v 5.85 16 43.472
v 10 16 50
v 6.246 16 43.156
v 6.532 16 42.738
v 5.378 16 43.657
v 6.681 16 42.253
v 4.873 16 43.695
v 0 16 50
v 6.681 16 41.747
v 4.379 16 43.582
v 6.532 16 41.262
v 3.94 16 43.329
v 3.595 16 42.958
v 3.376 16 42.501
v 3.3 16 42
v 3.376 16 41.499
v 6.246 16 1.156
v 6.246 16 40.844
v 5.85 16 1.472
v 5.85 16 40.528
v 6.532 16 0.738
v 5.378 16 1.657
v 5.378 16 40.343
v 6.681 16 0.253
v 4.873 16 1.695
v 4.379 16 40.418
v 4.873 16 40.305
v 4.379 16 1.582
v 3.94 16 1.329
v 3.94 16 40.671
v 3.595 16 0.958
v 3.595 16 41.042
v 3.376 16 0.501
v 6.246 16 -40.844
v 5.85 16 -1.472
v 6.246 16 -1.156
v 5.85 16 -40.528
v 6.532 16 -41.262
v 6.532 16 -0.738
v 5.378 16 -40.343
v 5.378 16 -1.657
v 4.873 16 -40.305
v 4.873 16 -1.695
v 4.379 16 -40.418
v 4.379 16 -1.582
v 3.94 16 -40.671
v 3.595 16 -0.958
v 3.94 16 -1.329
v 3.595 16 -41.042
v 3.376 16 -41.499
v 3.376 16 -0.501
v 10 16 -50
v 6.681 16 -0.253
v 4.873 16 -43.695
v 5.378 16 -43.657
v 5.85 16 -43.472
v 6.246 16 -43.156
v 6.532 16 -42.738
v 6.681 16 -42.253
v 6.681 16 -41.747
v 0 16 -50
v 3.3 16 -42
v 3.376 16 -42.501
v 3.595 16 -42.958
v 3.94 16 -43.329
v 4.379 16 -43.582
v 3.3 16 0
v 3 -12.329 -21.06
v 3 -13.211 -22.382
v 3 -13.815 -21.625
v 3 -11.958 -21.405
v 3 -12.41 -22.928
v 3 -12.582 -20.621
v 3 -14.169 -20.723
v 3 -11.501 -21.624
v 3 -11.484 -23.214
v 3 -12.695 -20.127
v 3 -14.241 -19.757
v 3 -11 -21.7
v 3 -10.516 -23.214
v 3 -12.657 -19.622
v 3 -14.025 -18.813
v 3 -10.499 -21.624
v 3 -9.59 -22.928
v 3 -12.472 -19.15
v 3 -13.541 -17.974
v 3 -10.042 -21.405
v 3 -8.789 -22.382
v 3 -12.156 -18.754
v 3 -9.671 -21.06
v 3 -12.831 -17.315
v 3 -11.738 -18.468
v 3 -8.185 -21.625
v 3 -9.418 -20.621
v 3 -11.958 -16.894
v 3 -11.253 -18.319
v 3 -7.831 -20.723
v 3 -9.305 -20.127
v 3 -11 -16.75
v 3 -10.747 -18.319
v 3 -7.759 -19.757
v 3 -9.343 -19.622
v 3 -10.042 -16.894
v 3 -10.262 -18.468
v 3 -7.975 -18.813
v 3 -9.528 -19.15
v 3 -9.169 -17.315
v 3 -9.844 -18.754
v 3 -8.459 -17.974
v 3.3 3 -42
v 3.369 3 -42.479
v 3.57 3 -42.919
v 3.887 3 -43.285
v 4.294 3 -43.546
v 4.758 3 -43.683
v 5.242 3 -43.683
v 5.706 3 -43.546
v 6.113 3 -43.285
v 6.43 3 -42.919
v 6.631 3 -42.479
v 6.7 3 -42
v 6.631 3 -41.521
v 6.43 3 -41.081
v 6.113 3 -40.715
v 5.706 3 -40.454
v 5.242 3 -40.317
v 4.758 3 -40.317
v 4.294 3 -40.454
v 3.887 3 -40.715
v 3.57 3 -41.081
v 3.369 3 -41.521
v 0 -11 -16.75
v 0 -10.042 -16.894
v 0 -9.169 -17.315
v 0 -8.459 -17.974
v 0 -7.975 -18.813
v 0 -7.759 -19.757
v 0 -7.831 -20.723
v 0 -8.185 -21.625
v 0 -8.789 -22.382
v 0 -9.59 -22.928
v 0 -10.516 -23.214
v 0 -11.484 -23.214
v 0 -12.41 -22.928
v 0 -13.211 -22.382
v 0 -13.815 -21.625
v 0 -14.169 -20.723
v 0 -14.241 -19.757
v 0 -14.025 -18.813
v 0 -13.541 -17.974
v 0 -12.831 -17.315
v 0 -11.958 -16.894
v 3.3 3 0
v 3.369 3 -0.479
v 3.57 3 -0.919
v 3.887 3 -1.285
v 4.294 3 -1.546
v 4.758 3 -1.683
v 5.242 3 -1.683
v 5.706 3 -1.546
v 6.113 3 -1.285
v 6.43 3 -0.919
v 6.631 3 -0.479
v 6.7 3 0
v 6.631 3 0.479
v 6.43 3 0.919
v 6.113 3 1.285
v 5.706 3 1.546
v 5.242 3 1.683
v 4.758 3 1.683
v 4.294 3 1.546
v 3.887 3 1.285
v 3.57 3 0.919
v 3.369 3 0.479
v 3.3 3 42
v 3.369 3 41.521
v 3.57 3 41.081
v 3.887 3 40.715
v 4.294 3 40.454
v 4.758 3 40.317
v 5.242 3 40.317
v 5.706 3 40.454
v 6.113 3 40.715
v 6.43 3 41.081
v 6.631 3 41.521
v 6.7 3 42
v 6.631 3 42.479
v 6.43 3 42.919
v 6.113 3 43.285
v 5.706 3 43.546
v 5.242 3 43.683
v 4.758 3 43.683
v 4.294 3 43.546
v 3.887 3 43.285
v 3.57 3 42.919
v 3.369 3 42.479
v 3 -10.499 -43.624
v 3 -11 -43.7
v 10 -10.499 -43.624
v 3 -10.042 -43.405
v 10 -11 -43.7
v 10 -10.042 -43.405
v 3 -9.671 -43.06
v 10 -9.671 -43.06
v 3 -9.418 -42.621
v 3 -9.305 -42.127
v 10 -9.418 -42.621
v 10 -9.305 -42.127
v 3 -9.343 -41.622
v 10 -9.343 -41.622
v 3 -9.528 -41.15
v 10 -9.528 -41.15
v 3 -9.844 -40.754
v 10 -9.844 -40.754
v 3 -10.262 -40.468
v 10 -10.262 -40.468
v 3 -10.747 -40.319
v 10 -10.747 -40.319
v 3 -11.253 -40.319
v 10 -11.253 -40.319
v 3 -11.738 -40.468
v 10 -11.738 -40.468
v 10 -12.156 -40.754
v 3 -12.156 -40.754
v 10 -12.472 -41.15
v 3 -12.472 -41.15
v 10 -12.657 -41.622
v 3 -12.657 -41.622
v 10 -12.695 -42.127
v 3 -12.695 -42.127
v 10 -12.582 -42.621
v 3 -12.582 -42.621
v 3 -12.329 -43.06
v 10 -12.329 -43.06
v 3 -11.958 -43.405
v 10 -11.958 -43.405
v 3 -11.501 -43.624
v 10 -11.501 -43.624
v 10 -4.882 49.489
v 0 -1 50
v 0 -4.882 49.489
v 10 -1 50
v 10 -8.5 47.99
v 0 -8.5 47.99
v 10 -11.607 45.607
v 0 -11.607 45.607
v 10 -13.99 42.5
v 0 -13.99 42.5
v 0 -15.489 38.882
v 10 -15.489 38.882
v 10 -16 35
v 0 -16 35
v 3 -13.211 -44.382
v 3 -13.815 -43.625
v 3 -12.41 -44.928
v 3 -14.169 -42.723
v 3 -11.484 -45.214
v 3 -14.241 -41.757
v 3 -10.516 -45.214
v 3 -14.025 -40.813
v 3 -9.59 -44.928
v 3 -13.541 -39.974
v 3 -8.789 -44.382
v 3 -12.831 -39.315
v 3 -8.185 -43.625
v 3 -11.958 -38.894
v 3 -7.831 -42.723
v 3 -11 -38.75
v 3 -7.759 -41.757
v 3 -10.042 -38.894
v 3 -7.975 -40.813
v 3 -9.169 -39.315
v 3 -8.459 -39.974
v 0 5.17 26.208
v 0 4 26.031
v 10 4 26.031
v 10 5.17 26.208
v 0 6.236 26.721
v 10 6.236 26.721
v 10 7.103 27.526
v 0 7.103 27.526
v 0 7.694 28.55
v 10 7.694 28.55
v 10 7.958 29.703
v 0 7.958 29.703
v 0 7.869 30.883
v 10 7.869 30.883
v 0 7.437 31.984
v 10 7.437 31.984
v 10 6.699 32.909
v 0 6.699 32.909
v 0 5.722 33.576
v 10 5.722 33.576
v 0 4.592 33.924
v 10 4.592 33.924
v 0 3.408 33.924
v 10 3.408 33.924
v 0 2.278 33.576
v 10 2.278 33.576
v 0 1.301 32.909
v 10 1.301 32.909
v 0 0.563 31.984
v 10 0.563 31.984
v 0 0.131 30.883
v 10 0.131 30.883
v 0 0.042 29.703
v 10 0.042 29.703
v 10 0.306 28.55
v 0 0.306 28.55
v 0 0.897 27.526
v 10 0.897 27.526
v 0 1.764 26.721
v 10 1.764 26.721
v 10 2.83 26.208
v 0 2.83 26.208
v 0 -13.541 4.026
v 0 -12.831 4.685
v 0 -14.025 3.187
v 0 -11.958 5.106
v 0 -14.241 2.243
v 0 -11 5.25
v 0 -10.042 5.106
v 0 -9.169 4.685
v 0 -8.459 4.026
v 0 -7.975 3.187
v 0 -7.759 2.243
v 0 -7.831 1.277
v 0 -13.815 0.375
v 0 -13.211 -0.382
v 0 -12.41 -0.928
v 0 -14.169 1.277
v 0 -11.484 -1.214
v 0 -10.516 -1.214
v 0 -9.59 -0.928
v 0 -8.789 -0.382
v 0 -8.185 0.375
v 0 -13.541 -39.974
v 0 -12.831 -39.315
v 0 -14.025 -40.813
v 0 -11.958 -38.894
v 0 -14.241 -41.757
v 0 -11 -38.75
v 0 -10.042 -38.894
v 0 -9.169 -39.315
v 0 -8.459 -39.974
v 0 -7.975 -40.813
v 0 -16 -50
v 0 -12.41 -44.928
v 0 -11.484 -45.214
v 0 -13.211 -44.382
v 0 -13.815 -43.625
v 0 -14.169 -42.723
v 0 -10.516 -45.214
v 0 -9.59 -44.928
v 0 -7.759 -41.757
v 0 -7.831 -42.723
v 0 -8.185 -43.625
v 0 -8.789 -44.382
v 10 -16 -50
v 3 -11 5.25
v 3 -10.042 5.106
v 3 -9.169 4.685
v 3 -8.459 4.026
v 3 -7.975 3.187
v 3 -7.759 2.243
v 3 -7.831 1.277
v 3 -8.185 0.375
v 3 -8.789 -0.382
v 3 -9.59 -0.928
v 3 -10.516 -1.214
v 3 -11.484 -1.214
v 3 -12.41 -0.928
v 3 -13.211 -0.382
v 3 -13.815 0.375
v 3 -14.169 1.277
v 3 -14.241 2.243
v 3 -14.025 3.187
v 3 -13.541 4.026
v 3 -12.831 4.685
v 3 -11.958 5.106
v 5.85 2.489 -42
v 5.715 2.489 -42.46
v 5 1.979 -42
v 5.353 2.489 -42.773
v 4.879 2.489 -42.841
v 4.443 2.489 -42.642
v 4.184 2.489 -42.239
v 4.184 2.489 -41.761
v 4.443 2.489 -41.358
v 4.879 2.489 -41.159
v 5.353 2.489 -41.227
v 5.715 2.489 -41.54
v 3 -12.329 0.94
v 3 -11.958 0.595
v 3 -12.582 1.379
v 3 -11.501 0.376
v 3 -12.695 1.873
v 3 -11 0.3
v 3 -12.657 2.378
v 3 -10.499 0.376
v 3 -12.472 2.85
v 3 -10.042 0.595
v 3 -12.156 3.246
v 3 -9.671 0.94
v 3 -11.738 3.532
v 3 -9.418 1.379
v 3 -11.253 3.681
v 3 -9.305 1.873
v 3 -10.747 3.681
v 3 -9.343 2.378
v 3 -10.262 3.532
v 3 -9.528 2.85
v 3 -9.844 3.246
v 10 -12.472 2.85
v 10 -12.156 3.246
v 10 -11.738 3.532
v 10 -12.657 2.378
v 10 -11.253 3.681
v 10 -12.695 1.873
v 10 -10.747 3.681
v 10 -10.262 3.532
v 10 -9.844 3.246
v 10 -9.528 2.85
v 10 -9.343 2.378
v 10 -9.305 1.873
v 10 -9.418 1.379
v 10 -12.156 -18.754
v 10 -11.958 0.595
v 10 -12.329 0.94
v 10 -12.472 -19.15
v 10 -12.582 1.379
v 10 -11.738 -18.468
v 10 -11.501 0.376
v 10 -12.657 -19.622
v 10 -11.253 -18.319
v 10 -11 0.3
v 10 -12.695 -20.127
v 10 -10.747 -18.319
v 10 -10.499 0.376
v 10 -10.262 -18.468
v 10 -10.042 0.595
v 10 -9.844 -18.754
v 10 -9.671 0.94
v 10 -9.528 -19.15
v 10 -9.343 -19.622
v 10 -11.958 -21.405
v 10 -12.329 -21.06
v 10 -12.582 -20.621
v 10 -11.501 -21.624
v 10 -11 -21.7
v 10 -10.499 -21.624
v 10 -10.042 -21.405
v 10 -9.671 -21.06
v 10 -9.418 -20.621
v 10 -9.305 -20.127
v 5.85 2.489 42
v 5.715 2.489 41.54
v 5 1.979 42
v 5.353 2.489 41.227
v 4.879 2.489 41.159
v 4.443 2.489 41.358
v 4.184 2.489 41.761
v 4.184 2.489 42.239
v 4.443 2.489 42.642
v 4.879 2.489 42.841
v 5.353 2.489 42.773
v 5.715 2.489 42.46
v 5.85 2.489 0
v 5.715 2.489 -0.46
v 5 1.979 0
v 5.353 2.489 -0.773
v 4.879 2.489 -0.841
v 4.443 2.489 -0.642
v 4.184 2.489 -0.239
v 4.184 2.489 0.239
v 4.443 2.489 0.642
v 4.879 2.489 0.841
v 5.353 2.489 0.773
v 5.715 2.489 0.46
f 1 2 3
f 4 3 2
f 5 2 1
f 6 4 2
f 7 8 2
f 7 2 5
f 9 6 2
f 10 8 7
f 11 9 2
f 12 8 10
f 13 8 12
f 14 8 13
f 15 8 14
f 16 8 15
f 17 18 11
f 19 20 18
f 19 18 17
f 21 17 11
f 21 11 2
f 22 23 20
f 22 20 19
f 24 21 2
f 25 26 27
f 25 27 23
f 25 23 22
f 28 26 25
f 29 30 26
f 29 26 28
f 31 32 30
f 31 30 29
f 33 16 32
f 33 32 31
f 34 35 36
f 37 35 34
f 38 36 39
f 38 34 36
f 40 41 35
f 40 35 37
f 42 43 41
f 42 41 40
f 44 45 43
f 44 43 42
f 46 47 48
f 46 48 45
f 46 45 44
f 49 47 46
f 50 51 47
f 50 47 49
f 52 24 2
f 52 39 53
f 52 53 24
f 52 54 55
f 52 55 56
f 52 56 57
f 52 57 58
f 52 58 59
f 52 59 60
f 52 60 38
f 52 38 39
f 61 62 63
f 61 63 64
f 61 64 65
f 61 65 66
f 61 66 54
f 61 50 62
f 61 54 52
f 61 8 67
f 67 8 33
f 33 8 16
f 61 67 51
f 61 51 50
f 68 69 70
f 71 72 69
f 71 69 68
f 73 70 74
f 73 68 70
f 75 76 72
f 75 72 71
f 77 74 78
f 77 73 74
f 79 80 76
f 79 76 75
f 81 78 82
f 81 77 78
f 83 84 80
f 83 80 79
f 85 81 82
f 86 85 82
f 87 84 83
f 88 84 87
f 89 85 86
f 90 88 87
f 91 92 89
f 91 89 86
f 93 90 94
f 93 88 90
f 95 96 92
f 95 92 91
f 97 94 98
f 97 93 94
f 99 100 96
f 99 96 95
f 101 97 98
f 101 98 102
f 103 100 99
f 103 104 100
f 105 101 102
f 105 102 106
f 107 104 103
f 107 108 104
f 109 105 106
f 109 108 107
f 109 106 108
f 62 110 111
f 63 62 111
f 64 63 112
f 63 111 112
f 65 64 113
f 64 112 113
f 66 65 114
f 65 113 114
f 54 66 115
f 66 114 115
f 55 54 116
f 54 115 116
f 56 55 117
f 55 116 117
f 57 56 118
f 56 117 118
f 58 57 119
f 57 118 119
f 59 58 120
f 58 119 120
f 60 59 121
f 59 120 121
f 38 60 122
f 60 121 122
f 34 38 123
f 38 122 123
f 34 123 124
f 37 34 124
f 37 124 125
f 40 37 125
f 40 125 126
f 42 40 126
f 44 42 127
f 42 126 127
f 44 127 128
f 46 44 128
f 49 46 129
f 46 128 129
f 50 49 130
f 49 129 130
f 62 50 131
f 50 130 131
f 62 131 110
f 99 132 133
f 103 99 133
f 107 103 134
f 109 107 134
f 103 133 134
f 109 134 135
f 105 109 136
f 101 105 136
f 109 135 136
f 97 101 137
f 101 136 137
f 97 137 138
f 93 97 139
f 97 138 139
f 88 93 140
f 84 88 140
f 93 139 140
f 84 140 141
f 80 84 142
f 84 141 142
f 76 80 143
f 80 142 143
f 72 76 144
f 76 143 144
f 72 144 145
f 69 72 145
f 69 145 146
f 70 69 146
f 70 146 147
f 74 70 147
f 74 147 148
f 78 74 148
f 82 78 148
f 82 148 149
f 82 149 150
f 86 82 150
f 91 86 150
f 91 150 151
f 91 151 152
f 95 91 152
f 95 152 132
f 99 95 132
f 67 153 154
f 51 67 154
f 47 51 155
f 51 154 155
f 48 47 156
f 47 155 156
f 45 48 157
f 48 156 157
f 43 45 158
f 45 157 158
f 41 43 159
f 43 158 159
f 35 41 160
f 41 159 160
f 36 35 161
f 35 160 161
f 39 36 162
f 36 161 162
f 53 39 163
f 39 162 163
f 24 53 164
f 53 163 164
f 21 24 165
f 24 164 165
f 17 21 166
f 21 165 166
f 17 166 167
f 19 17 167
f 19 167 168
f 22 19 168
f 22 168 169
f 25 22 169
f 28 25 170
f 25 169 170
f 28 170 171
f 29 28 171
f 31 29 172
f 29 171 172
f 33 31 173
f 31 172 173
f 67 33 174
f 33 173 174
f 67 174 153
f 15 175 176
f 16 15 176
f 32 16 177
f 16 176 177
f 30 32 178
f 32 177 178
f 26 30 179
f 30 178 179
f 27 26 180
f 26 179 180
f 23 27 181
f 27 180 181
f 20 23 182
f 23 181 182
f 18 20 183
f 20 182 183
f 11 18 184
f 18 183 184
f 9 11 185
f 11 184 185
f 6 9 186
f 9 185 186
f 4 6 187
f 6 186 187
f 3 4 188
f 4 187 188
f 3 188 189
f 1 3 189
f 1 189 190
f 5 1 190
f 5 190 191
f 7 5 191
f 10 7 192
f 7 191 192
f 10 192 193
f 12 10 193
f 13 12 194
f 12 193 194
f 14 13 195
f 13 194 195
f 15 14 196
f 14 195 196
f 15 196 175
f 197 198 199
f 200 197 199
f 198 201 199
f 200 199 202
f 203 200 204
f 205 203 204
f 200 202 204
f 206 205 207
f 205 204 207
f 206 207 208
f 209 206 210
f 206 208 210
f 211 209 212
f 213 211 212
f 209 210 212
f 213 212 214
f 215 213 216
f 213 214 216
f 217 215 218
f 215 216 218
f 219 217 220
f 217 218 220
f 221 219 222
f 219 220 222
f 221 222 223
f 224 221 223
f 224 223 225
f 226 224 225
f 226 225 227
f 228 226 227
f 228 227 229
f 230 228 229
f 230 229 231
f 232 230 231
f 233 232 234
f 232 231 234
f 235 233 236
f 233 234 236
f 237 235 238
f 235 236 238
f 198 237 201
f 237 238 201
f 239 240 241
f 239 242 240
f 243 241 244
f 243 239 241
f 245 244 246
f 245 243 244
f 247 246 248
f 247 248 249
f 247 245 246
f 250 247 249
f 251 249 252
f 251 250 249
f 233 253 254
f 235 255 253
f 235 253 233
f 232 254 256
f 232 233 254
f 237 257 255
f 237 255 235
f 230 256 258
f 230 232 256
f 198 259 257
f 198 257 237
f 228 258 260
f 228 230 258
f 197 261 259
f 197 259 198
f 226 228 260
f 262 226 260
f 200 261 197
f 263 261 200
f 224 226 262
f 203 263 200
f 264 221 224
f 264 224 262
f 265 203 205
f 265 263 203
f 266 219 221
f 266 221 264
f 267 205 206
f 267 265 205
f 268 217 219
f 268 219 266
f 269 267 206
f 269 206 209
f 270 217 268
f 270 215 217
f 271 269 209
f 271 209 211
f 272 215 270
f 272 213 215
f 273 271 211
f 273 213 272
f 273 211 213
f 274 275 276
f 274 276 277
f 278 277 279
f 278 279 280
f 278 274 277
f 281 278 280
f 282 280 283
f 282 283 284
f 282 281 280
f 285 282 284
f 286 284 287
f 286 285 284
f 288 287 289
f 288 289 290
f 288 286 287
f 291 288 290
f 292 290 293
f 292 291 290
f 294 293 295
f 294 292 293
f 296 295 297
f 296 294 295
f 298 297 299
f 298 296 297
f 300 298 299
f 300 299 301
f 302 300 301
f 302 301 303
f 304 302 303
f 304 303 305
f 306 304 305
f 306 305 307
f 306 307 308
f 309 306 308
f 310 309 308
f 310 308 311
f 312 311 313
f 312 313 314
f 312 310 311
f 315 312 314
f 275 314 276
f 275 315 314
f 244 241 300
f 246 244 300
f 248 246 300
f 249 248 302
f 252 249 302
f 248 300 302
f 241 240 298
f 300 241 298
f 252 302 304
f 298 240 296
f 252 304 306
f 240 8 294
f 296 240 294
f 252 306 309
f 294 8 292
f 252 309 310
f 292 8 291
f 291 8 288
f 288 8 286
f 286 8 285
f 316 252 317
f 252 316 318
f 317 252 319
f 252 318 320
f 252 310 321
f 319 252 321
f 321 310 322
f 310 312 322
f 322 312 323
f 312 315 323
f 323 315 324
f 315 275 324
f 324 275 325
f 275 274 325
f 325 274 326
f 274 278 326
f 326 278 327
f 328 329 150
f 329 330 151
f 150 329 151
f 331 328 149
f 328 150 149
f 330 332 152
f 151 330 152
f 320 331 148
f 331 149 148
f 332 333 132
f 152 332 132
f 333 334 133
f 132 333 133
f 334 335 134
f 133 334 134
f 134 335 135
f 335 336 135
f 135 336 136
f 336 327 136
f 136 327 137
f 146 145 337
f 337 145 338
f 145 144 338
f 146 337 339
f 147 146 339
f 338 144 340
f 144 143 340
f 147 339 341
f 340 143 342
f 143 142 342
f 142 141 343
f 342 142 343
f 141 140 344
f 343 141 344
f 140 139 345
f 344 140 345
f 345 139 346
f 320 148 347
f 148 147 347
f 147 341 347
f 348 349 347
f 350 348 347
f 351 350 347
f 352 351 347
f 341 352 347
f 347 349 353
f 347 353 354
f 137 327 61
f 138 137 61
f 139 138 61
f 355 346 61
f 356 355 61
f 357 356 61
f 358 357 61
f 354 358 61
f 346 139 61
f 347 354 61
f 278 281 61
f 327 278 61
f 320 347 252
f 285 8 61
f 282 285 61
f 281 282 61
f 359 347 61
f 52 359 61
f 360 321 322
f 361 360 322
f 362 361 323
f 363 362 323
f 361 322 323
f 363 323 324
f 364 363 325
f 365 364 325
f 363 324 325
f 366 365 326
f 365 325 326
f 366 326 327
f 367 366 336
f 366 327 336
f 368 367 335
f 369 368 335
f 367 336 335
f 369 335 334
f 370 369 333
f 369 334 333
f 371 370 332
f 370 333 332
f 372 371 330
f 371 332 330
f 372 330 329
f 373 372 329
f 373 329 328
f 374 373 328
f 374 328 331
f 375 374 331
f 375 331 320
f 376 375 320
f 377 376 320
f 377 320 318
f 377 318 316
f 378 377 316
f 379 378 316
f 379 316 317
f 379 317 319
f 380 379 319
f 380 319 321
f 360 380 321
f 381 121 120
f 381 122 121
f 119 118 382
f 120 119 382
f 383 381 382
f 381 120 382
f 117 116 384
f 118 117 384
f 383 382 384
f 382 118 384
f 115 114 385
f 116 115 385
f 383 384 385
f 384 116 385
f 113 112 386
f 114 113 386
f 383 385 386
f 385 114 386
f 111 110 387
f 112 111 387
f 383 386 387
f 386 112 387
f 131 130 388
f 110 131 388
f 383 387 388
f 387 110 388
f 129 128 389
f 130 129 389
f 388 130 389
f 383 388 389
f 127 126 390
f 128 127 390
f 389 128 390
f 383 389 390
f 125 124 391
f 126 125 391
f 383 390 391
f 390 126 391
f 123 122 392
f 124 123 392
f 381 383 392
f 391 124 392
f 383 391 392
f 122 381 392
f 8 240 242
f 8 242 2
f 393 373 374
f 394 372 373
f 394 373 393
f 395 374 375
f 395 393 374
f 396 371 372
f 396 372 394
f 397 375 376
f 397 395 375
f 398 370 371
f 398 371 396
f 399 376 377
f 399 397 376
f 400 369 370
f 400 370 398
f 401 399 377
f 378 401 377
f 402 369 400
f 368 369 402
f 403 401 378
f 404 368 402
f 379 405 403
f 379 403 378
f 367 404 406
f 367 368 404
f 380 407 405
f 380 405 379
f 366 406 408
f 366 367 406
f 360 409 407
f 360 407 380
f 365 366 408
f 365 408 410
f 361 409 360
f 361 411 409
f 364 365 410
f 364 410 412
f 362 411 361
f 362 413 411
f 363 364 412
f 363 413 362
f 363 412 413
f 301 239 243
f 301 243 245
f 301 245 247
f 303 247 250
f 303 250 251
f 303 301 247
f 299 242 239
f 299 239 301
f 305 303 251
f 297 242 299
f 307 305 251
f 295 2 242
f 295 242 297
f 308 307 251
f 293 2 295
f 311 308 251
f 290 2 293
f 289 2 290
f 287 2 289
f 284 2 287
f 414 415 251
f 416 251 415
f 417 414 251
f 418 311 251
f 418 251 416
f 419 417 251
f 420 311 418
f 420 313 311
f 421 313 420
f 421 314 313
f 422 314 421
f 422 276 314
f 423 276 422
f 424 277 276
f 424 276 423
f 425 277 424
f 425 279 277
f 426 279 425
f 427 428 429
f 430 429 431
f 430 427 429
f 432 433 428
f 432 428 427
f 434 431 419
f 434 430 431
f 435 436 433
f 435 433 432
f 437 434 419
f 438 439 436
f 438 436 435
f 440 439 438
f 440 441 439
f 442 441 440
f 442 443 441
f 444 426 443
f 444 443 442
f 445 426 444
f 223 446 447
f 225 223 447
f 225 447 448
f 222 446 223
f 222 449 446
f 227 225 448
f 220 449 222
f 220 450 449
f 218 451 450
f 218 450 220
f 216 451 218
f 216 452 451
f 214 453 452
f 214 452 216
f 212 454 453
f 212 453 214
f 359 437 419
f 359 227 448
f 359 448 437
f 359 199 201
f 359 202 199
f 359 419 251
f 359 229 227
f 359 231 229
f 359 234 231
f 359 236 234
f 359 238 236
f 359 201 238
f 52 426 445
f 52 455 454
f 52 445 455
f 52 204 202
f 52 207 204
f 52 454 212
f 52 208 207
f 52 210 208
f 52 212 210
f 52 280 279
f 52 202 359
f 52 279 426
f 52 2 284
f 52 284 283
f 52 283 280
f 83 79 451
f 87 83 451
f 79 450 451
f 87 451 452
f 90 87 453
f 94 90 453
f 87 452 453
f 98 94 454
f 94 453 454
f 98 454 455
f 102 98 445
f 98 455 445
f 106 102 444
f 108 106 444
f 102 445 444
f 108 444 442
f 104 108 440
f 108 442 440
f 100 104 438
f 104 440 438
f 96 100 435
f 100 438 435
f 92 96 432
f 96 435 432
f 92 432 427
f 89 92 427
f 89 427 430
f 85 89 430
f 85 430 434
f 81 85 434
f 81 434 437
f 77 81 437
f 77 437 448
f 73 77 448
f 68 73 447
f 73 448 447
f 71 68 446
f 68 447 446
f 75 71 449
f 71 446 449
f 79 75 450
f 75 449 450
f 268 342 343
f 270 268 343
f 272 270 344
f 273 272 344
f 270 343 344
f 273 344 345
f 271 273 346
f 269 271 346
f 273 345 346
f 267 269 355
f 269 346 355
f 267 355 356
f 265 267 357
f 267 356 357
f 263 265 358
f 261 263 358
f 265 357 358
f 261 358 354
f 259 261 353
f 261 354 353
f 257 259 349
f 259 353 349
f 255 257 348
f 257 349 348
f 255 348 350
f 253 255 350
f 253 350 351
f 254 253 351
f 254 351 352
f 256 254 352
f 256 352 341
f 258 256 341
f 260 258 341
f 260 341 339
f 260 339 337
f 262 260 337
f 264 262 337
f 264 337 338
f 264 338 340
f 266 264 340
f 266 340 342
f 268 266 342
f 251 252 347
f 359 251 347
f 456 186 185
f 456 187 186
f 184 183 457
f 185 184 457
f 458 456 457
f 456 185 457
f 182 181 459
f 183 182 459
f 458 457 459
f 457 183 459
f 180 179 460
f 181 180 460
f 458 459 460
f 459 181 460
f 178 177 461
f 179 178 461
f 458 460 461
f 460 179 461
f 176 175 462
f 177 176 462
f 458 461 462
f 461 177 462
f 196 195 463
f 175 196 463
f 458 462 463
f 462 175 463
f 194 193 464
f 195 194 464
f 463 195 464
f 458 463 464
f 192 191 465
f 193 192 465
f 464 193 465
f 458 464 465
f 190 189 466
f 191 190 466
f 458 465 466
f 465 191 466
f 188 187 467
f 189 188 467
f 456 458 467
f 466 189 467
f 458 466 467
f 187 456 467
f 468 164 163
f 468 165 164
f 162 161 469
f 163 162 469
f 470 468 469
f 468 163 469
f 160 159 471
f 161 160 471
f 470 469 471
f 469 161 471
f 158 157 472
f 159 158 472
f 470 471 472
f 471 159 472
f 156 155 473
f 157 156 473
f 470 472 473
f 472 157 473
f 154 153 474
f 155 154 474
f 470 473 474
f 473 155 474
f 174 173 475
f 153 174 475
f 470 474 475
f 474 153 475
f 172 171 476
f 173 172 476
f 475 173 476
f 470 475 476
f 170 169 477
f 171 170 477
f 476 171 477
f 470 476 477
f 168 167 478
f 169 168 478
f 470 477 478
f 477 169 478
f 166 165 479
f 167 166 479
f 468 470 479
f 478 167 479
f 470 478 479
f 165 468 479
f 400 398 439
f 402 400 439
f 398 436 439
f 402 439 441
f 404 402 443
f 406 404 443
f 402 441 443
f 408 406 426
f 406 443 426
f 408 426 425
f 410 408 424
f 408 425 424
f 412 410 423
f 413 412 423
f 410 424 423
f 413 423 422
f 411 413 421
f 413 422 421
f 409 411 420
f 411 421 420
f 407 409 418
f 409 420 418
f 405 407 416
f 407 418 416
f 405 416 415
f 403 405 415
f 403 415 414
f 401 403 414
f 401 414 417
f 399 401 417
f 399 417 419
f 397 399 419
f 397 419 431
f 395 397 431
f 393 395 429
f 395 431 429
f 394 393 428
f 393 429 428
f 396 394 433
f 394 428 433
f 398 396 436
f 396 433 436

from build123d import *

# Parameters (mm, degrees)
SKETCH1_W                      = 100
SKETCH1_H                      = 32
SKETCH1_R                      = 3.96875
BOSS_EXTRUDE1_DEPTH            = 10
FILLET1_R                      = 15
CBORE_FOR_M3_SHCS_D            = 3.4
CBORE_FOR_M3_SHCS_DEPTH        = 23
CBORE_FOR_M3_SHCS_CBORE_D      = 6.5
CBORE_FOR_M3_SHCS_CBORE_DEPTH  = 3
CBORE_FOR_M3_SHCS_TIP          = 1.021463052
CBORE_FOR_M3_SHCS1_D           = 3.4
CBORE_FOR_M3_SHCS1_DEPTH       = 23
CBORE_FOR_M3_SHCS1_CBORE_D     = 6.5
CBORE_FOR_M3_SHCS1_CBORE_DEPTH = 3
CBORE_FOR_M3_SHCS1_TIP         = 1.021463052


with BuildPart() as part:
    # Sketch1 → Boss-Extrude1 (new body)
    with BuildSketch(Plane(origin=(0, 0, 0), x_dir=(0, 0, -1), z_dir=(1, 0, 0))):
        Rectangle(SKETCH1_W, SKETCH1_H)
        with Locations((-30, 4)):
            Circle(SKETCH1_R, mode=Mode.SUBTRACT)
    extrude(amount=BOSS_EXTRUDE1_DEPTH)

    # Fillet1
    fillet1_edges = [part.edges().sort_by_distance(p)[0] for p in [
        (5, -16, 50),
    ]]
    fillet(fillet1_edges, radius=FILLET1_R)

    # CBORE for M3 SHCS
    with Locations(Plane(origin=(-616.293536786, 26, -1323.282701689), x_dir=(1, 0, 0), z_dir=(0, 1, 0))):
        with Locations((731.293536786, -1281.282701689), (731.293536786, -1343.282701689), (621.293536786, -1281.282701689), (621.293536786, -1365.282701689), (621.293536786, -1323.282701689), (731.293536786, -1312.282701689)):
            CounterBoreHole(CBORE_FOR_M3_SHCS_D / 2, CBORE_FOR_M3_SHCS_CBORE_D / 2, CBORE_FOR_M3_SHCS_CBORE_DEPTH, depth=CBORE_FOR_M3_SHCS_DEPTH)
            with Locations((0, 0, -(CBORE_FOR_M3_SHCS_DEPTH + CBORE_FOR_M3_SHCS_TIP / 2))):  # 118° drill point
                Cone(0, CBORE_FOR_M3_SHCS_D / 2, CBORE_FOR_M3_SHCS_TIP, mode=Mode.SUBTRACT)

    # CBORE for M3 SHCS1
    with Locations(Plane(origin=(0, -904.012147263, -1323.282701689), x_dir=(0, 0, 1), z_dir=(-1, 0, 0))):
        with Locations((1281.282701689, 893.012147263), (1325.282701689, 893.012147263), (1303.282701689, 893.012147263)):
            CounterBoreHole(CBORE_FOR_M3_SHCS1_D / 2, CBORE_FOR_M3_SHCS1_CBORE_D / 2, CBORE_FOR_M3_SHCS1_CBORE_DEPTH, depth=CBORE_FOR_M3_SHCS1_DEPTH)
            with Locations((0, 0, -(CBORE_FOR_M3_SHCS1_DEPTH + CBORE_FOR_M3_SHCS1_TIP / 2))):  # 118° drill point
                Cone(0, CBORE_FOR_M3_SHCS1_D / 2, CBORE_FOR_M3_SHCS1_TIP, mode=Mode.SUBTRACT)


solid = part.part
